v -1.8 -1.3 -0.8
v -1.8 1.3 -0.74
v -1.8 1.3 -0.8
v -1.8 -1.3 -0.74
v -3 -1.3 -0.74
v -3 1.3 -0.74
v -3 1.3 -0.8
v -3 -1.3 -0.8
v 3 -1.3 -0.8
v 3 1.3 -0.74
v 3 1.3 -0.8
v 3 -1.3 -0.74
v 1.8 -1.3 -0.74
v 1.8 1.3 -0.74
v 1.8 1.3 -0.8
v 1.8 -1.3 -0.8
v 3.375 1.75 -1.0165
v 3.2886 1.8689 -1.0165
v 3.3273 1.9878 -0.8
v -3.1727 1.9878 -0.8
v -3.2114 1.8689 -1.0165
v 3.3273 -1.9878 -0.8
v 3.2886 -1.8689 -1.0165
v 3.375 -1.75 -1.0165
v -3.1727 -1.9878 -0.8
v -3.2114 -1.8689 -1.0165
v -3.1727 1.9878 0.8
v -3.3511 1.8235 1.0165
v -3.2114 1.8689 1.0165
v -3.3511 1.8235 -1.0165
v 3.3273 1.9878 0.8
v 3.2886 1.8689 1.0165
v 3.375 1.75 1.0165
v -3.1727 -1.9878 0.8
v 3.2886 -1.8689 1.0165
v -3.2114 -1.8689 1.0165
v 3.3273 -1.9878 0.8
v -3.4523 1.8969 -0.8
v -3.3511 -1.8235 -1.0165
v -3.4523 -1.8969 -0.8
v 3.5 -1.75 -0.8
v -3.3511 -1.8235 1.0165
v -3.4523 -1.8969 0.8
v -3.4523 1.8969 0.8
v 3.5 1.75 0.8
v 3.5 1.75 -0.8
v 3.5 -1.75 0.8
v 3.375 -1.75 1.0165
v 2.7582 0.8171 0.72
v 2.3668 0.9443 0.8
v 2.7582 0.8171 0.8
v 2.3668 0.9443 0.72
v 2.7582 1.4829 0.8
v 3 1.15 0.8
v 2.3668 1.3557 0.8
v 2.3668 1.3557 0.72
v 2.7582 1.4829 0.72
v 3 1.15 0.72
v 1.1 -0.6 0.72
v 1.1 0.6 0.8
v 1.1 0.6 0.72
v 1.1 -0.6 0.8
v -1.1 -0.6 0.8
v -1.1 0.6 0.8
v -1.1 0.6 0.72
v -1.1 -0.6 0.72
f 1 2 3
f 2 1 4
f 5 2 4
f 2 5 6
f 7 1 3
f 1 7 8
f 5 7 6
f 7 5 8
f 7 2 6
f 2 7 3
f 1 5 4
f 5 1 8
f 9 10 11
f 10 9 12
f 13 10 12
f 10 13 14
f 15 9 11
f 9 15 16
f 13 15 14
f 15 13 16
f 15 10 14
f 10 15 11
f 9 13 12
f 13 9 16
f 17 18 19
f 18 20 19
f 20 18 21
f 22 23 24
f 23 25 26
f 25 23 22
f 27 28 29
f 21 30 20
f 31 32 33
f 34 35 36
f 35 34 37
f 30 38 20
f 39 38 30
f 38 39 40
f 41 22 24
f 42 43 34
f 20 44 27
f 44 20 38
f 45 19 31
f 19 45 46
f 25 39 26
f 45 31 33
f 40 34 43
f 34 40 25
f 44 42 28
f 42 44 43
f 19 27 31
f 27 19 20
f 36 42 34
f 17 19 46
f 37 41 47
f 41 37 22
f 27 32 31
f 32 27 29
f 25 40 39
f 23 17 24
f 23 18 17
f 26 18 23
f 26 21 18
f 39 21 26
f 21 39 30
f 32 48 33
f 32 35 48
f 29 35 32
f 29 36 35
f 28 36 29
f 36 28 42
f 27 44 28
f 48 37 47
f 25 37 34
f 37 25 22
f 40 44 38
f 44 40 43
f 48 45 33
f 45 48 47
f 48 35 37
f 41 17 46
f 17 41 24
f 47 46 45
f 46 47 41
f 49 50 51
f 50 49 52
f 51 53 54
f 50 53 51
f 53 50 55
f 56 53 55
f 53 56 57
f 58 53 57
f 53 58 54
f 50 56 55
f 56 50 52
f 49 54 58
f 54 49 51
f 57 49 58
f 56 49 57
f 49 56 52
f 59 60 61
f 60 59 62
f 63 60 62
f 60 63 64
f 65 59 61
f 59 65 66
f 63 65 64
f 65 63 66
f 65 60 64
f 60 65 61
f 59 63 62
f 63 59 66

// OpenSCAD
// Parameters
body_L = 6.5; //[3.25:13:0.1]
body_W = 3.5; //[1.75:7:0.1]
body_H = 1.6; //[0.8:3.2:0.05]
chamfer = 0.25; //[0.1:0.6:0.05]
mark_depth = 0.08; //[0.03:0.2:0.01]
polarity_r = 0.35; //[0.15:0.8:0.05]
top_mark_L = 2.2; //[1:4.4:0.1]
top_mark_W = 1.2; //[0.6:2.4:0.1]
pad_recess_depth = 0.06; //[0.02:0.2:0.01]
pad_L = 1.2; //[0.6:2.4:0.1]
pad_W = 2.6; //[1.3:3.4:0.1]
pad_edge_margin = 0.25; //[0.1:0.8:0.05]

// Base shapes
module smd_body() {
  cube([body_L, body_W, body_H], center=true);
}

module edge_chamfer() {
  sphere(r=chamfer, center=true);
}

module polarity_mark() {
  translate([body_L/2 - polarity_r - chamfer, body_W/2 - polarity_r - chamfer, body_H/2 - mark_depth/2])
    cylinder(r=polarity_r, h=mark_depth, center=true);
}

module top_marking() {
  translate([0, 0, body_H/2 - mark_depth/2])
    cube([top_mark_L, top_mark_W, mark_depth], center=true);
}

module terminal_pad_left() {
  translate([-body_L/2 + pad_edge_margin + pad_L/2, 0, -body_H/2 + pad_recess_depth/2])
    cube([pad_L, pad_W, pad_recess_depth], center=true);
}

module terminal_pad_right() {
  translate([body_L/2 - pad_edge_margin - pad_L/2, 0, -body_H/2 + pad_recess_depth/2])
    cube([pad_L, pad_W, pad_recess_depth], center=true);
}

// Operations
module body_with_edge_chamfer() {
  minkowski() {
    smd_body();
    edge_chamfer();
  }
}

module terminal_pads() {
  union() {
    terminal_pad_left();
    terminal_pad_right();
  }
}

module body_minus_pads() {
  difference() {
    body_with_edge_chamfer();
    terminal_pads();
  }
}

module body_minus_pads_and_marks() {
  difference() {
    body_minus_pads();
    polarity_mark();
    top_marking();
  }
}

// Final output
body_minus_pads_and_marks();
